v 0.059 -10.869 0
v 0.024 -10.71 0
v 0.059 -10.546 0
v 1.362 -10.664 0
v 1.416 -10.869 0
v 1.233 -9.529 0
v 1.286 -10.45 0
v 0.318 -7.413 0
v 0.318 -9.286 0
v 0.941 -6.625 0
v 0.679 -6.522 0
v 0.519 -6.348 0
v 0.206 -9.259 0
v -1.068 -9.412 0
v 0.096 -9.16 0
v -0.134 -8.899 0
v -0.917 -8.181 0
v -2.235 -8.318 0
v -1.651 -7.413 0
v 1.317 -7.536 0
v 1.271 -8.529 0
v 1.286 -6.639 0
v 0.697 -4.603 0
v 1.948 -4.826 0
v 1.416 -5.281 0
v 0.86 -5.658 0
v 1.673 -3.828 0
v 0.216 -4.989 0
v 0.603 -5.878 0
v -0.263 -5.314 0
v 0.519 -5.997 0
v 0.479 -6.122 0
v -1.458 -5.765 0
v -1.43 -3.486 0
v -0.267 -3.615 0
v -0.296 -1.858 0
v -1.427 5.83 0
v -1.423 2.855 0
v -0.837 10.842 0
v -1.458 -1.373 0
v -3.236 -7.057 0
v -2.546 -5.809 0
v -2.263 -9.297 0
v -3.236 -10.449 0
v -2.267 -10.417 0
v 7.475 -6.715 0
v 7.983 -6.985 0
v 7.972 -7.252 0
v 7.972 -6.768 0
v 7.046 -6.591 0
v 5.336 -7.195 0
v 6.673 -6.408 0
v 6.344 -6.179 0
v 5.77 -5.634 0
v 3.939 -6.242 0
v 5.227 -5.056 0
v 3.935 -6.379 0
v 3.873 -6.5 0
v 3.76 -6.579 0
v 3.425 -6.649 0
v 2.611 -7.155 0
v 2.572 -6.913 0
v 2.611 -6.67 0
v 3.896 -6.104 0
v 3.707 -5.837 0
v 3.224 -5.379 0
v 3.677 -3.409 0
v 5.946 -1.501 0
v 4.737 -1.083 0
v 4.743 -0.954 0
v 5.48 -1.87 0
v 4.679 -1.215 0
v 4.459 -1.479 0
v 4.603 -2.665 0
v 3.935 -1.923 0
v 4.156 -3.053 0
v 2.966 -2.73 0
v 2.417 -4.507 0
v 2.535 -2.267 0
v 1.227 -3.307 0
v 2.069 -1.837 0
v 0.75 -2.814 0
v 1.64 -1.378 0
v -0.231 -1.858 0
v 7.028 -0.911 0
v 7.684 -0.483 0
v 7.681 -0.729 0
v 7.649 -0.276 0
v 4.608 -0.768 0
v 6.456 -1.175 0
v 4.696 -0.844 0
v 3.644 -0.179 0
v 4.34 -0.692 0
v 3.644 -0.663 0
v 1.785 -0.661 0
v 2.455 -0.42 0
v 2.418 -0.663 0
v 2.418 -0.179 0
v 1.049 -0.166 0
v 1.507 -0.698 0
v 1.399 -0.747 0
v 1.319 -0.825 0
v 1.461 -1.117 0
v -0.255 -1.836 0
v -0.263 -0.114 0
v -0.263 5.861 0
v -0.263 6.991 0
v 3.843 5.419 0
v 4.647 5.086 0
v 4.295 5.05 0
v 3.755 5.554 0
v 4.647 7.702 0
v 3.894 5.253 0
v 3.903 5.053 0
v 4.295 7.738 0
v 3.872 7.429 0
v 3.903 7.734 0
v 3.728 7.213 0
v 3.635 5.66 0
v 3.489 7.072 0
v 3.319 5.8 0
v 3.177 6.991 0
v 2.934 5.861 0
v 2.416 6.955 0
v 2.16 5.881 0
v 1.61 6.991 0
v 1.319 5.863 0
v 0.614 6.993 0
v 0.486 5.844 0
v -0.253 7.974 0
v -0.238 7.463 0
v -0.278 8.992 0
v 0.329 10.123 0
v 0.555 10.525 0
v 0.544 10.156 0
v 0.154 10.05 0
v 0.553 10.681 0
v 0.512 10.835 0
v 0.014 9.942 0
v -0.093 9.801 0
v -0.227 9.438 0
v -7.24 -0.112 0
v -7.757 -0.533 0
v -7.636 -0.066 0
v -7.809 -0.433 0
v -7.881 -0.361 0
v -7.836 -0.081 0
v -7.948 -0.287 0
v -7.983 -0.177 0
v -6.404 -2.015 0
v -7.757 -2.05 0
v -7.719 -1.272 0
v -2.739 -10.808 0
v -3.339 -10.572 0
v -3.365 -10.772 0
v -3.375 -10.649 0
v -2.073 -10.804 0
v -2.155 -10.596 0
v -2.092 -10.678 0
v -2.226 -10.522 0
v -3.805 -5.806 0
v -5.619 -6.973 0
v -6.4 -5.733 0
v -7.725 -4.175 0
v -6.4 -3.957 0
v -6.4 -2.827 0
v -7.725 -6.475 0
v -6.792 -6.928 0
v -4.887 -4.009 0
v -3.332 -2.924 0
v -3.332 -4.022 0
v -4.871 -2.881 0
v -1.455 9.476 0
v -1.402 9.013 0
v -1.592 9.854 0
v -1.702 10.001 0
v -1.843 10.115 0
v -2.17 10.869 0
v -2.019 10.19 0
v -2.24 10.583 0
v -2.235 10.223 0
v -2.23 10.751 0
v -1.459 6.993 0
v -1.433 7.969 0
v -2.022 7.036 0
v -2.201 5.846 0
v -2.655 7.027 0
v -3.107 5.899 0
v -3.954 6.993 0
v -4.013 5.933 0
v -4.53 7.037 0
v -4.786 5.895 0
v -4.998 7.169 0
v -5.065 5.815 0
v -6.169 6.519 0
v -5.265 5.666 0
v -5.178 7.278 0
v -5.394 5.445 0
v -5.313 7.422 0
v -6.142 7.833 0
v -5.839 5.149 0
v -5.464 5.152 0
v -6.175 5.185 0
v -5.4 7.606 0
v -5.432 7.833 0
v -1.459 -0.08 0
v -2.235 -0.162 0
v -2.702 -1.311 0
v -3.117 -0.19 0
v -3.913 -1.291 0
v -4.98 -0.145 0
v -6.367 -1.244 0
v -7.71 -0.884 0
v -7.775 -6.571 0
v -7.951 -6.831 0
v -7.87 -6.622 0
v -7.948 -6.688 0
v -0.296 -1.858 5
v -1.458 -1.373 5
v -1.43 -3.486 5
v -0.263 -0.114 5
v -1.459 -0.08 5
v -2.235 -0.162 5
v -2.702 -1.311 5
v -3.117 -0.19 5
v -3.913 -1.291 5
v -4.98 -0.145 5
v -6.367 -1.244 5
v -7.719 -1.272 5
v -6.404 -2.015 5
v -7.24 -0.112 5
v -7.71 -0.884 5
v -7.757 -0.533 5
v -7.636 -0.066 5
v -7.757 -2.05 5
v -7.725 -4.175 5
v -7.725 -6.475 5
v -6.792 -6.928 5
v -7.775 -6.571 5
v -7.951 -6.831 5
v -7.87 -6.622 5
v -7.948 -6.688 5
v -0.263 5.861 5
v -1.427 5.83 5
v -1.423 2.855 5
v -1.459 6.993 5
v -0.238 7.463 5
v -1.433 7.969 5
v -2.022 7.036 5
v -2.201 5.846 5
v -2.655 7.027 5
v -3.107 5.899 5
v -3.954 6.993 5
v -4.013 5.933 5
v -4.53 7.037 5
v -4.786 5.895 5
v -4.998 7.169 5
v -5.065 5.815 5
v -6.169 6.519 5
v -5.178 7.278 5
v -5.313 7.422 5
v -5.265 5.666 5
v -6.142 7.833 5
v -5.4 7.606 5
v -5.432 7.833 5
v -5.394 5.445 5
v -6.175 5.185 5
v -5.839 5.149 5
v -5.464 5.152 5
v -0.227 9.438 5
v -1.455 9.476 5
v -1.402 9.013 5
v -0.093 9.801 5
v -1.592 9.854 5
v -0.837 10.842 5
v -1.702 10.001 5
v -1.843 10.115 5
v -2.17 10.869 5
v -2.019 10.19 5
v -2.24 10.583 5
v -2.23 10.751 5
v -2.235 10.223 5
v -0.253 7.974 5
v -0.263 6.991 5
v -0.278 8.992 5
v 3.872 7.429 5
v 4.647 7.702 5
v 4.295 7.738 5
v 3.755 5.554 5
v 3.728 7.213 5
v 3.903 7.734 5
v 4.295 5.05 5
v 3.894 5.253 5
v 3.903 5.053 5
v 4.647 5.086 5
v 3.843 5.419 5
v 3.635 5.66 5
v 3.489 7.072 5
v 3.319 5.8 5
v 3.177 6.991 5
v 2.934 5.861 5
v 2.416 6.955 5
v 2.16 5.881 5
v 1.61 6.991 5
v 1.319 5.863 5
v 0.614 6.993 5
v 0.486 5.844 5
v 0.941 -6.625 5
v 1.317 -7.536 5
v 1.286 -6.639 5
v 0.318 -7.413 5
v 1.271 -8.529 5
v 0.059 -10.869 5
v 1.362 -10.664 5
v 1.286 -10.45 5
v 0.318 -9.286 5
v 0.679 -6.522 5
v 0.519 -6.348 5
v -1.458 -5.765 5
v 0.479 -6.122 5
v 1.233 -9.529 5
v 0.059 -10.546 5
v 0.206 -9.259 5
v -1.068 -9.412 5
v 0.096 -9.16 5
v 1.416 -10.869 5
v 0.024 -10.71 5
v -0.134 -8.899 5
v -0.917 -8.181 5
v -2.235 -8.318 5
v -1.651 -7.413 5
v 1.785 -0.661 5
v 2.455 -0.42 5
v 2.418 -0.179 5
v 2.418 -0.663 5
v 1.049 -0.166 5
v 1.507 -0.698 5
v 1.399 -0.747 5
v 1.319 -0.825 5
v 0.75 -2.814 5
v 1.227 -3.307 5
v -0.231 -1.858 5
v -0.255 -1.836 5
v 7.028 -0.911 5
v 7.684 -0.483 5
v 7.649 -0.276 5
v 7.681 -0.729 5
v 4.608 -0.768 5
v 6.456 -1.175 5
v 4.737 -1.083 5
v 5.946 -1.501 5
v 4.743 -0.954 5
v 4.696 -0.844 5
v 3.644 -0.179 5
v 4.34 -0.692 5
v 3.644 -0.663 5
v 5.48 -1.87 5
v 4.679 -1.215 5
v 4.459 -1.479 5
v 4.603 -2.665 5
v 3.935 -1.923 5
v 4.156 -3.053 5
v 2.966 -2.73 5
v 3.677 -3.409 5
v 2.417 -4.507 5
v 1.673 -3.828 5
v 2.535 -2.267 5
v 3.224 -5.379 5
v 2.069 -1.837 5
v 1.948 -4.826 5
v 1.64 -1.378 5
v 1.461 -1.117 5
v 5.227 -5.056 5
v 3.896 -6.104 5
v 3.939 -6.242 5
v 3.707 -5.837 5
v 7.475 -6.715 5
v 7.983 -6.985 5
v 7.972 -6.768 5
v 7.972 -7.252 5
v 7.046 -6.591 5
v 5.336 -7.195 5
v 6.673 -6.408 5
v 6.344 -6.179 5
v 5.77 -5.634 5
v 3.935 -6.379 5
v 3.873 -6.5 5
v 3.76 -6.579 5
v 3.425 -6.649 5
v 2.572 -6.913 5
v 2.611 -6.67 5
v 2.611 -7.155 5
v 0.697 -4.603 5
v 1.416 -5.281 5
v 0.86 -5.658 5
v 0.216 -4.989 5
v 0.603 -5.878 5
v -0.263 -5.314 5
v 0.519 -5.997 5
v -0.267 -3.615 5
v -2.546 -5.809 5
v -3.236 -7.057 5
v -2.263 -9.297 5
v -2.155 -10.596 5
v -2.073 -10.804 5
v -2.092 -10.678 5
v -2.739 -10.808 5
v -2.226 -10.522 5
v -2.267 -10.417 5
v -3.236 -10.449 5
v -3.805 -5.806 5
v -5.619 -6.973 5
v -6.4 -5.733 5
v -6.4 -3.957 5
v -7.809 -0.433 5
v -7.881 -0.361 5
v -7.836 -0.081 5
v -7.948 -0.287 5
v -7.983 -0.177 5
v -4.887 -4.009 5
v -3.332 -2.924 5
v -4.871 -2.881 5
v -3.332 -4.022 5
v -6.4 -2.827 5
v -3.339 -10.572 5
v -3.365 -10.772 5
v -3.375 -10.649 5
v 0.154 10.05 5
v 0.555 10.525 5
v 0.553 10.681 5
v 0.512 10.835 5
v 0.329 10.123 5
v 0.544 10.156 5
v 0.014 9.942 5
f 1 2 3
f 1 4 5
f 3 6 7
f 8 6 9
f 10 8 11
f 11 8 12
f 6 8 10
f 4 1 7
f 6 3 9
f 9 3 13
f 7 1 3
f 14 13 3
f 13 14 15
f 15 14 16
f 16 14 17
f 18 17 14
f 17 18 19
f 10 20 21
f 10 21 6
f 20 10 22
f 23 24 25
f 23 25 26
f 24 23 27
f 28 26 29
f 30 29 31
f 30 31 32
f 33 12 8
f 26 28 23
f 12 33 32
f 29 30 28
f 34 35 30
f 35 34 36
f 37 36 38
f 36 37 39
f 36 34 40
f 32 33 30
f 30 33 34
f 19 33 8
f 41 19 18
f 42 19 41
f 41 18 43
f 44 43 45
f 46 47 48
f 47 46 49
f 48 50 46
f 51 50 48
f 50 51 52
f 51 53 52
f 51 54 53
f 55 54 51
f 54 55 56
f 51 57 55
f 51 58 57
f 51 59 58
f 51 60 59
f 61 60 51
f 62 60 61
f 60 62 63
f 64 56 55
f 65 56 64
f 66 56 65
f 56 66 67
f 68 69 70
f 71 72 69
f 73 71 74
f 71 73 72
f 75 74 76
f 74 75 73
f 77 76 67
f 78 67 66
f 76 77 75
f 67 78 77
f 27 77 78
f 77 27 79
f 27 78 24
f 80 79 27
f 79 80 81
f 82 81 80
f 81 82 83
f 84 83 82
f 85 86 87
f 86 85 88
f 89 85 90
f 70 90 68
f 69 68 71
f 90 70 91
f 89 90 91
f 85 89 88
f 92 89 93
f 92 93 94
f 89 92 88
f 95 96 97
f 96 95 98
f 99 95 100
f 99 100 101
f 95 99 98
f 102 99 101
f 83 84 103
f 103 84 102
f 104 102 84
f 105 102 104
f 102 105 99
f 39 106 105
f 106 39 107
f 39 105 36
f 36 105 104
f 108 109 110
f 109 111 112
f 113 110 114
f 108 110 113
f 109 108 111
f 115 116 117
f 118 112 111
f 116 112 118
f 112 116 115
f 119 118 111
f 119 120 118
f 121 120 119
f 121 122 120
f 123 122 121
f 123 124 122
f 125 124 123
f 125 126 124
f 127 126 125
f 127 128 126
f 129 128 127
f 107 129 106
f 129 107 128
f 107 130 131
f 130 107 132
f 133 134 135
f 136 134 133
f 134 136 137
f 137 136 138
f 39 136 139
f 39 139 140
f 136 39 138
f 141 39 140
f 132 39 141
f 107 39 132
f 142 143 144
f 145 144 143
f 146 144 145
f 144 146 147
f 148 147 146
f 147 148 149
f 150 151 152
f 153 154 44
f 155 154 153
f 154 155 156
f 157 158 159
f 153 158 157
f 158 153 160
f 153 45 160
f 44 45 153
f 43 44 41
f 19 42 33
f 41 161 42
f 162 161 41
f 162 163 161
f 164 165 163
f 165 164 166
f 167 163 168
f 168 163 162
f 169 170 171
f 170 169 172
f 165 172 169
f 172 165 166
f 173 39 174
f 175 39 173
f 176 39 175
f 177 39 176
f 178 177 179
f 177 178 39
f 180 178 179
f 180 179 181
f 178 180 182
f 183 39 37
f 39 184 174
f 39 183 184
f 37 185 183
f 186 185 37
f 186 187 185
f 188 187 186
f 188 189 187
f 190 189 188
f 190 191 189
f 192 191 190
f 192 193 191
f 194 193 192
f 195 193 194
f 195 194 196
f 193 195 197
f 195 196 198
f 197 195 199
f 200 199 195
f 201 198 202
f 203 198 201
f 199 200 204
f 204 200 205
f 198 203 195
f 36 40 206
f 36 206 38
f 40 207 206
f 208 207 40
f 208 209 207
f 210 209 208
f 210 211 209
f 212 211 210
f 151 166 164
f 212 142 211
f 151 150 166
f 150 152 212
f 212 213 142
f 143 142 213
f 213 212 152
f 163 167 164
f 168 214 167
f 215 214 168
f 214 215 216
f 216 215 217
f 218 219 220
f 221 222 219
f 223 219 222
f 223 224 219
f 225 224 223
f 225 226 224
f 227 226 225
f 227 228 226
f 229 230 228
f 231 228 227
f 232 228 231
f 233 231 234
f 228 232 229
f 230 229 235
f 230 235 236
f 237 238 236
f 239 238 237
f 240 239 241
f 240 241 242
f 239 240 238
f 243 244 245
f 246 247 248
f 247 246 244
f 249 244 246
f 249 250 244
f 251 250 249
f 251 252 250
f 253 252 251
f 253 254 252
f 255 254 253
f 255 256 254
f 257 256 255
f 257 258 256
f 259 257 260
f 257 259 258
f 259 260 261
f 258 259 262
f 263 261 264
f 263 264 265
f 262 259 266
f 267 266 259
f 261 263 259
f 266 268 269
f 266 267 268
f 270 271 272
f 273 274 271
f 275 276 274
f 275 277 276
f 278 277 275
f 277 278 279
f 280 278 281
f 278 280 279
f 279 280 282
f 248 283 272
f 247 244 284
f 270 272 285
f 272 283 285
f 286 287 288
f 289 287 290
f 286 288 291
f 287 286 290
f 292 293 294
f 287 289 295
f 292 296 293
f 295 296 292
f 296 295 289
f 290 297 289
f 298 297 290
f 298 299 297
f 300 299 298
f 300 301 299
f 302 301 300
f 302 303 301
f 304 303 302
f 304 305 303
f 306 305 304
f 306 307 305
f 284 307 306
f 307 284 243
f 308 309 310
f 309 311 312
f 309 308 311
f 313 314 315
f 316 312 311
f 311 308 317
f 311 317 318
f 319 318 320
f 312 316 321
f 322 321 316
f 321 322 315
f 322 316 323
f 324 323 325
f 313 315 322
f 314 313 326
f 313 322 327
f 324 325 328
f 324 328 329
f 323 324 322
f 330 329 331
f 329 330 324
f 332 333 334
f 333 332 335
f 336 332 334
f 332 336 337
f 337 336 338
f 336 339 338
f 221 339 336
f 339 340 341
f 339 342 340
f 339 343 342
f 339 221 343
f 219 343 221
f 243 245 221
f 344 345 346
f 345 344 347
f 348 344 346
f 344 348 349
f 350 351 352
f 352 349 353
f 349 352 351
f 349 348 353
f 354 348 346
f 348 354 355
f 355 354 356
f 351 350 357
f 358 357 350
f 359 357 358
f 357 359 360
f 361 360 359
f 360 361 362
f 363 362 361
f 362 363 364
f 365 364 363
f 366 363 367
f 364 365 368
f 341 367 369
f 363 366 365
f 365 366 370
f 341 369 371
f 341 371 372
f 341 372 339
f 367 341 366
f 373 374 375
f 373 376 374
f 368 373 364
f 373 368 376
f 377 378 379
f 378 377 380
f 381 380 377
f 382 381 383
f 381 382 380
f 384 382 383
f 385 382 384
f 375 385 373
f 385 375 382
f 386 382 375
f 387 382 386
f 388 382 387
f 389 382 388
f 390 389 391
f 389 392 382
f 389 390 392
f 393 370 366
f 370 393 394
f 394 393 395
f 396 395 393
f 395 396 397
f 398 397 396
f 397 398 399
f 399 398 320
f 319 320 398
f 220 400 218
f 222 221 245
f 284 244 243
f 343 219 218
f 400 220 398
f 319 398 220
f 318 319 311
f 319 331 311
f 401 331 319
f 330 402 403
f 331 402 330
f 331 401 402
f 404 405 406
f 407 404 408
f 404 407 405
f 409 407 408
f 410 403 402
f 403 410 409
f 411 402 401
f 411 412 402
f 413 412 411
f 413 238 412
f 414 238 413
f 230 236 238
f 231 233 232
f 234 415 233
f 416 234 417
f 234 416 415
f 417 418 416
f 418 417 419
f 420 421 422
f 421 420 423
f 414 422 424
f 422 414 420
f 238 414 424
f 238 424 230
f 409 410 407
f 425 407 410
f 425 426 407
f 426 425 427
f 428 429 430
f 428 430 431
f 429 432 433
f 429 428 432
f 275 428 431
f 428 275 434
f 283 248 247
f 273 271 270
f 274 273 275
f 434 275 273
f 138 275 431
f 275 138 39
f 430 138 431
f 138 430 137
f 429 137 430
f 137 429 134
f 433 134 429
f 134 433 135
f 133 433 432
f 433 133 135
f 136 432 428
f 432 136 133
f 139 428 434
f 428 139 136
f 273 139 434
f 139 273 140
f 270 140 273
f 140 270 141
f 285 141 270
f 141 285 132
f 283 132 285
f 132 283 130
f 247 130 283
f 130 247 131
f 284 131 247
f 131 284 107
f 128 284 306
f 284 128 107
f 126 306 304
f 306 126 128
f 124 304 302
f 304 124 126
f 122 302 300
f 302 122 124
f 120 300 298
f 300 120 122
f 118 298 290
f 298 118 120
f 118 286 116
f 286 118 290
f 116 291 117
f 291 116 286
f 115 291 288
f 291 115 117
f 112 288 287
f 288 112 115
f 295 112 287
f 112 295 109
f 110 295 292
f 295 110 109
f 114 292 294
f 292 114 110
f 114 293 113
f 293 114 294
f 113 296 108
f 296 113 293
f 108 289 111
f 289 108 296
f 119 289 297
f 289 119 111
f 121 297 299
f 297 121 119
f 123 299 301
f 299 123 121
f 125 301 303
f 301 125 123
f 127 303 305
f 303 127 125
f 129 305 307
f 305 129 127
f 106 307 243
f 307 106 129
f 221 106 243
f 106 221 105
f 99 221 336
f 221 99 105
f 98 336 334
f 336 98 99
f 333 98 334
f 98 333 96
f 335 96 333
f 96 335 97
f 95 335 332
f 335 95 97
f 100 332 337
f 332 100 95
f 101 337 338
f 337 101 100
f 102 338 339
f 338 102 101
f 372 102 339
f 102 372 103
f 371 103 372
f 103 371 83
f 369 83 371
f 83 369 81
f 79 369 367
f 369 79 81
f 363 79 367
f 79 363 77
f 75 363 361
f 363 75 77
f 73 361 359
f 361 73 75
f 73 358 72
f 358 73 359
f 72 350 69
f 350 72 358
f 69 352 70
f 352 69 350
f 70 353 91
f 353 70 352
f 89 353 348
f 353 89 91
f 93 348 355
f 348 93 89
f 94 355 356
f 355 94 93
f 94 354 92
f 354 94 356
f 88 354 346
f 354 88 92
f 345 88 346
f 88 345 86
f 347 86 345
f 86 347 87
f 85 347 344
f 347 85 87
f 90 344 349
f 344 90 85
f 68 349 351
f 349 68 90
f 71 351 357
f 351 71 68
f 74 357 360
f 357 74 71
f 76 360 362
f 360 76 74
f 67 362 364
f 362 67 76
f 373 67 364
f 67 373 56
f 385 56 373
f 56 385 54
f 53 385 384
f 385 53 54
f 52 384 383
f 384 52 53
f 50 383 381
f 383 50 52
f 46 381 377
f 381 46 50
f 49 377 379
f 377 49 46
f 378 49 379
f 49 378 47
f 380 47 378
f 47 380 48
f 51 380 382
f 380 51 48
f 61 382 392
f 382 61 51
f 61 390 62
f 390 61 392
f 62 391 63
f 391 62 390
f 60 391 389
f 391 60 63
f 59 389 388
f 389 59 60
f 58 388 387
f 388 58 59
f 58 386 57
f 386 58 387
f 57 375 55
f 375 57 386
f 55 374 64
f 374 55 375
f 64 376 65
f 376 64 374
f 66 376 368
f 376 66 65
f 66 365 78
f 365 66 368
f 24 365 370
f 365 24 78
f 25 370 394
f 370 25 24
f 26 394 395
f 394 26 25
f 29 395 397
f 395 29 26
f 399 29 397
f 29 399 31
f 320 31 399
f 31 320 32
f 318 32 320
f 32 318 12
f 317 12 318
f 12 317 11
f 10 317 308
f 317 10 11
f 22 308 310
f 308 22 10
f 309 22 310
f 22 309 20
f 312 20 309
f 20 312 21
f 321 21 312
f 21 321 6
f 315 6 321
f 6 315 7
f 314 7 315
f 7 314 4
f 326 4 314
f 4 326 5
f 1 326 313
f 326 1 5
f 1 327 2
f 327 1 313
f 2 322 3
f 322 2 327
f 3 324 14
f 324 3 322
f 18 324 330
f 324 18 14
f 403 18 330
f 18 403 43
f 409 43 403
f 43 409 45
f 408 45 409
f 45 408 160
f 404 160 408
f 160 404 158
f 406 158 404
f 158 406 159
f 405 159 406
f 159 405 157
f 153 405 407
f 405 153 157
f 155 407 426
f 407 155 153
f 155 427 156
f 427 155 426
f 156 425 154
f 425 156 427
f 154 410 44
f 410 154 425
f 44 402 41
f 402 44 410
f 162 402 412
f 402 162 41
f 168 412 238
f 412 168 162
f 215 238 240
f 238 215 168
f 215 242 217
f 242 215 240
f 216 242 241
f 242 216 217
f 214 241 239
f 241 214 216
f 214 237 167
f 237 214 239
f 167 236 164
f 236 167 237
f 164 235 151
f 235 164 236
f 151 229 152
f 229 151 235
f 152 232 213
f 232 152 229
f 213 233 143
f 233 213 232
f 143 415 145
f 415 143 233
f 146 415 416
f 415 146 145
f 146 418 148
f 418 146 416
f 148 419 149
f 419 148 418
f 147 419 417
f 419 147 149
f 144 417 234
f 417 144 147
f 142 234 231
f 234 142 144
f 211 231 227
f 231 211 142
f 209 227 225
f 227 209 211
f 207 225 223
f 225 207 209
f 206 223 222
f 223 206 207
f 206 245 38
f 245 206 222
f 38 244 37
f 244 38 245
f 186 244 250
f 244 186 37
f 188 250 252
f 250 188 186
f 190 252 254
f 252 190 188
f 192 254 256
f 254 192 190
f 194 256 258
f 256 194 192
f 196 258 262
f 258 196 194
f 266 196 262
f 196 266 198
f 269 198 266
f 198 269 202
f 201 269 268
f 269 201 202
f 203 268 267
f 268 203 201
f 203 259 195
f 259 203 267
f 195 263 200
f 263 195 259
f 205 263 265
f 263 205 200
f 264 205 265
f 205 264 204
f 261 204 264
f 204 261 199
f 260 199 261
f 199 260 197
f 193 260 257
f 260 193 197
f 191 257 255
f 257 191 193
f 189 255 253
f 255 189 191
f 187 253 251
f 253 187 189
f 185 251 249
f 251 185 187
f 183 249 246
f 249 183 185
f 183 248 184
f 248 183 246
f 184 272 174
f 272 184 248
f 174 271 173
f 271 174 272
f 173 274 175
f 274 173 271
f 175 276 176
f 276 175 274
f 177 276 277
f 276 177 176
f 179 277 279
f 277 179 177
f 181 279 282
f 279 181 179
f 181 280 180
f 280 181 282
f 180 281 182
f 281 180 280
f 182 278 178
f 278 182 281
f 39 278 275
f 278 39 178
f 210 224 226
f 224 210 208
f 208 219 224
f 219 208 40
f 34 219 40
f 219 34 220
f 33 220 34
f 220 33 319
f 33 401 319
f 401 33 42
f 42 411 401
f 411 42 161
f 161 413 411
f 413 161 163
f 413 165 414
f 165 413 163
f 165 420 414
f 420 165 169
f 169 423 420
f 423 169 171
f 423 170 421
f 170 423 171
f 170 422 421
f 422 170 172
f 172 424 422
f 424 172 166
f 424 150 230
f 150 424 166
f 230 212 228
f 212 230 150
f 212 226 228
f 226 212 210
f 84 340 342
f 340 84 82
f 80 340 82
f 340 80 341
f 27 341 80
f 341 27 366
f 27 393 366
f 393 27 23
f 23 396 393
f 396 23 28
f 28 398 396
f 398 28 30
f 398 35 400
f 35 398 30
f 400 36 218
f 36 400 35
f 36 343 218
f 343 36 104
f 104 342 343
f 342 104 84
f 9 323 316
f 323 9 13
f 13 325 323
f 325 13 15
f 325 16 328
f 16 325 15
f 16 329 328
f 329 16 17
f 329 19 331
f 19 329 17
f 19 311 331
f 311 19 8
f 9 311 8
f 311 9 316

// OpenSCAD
// Module names are of the form poly_<inkscape-path-id>().  As a result,
// you can associate a polygon in this OpenSCAD program with the corresponding
// SVG element in the Inkscape document by looking for the XML element with
// the attribute id="inkscape-path-id".

// fudge value is used to ensure that subtracted solids are a tad taller
// in the z dimension than the polygon being subtracted from.  This helps
// keep the resulting .stl file manifold.
fudge = 0.1;

module poly_path2(h)
{
  scale([25.4/90, -25.4/90, 1]) union()
  {
    difference()
    {
       linear_extrude(height=h)
         polygon([[1.813375,-38.390500],[1.959031,-37.847828],[1.966875,-37.293625],[1.928375,-35.987500],[1.166093,-35.870010],[0.544621,-35.611672],[0.050456,-35.225998],[-0.329906,-34.726500],[-0.803230,-33.440078],[-0.983375,-31.860500],[-0.896219,-28.254250],[-0.844965,-26.443766],[-0.932625,-24.772500],[2.176250,-24.777750],[5.704375,-24.772500],[8.560156,-24.644734],[11.256375,-24.771875],[12.361777,-25.057100],[13.207844,-25.557328],[13.721426,-26.322986],[13.829375,-27.404500],[15.217375,-27.417250],[16.464375,-27.290500],[16.464375,-18.020500],[15.217375,-17.892875],[13.829375,-17.905500],[13.796545,-18.614137],[13.615859,-19.201906],[13.304650,-19.679098],[12.880250,-20.056000],[11.761203,-20.550094],[10.397375,-20.766500],[7.655203,-20.838500],[4.675000,-20.774000],[1.723484,-20.705750],[-0.932625,-20.766500],[-0.932625,0.405500],[3.718375,0.589375],[8.567375,0.634500],[8.697875,1.486875],[8.567375,2.350500],[6.323750,2.341375],[5.339047,2.472141],[4.955662,2.646619],[4.673375,2.922500],[5.177783,3.959068],[5.810266,4.883547],[7.332000,6.510375],[8.983672,8.031266],[10.510375,9.674500],[13.944375,6.813500],[15.801125,5.241000],[16.580531,4.305313],[16.783285,3.836367],[16.804375,3.380500],[16.637797,2.991588],[16.326750,2.722453],[15.377375,2.452625],[12.912375,2.350500],[12.912375,0.634500],[27.101375,0.977500],[27.225125,1.711250],[27.215375,2.581500],[24.902027,3.228287],[22.875344,4.162172],[21.069113,5.316814],[19.417125,6.625875],[16.311031,9.441891],[14.724504,10.816166],[13.027375,12.079500],[18.519375,17.915500],[20.444109,19.962266],[22.478250,21.894375],[23.643662,22.705314],[24.965203,23.353047],[26.485799,23.792725],[28.248375,23.979500],[28.286625,24.749625],[28.248375,25.694500],[18.908625,25.495000],[9.252375,25.352500],[9.114375,24.495375],[9.252375,23.634500],[12.134500,23.559375],[13.323047,23.311766],[13.722982,23.030572],[13.943375,22.604500],[13.958467,22.116094],[13.803297,21.629000],[13.134000,20.682000],[11.422375,19.059500],[8.564375,15.968500],[6.902250,17.100625],[5.017375,18.713500],[3.047250,20.046750],[2.137234,20.827094],[1.838842,21.248074],[1.697375,21.690500],[1.837547,22.492281],[2.406250,23.108250],[3.335516,23.473344],[4.557375,23.522500],[4.665375,26.702797],[4.504125,30.219375],[4.369500,33.763516],[4.557375,37.026500],[4.826750,37.785125],[5.017375,38.511500],[0.208375,38.511500],[0.085750,37.950375],[0.208375,37.367500],[-3.784875,33.349000],[-7.917625,29.471500],[-8.018500,32.942750],[-8.031625,36.910500],[-7.887859,37.281797],[-7.637500,37.546125],[-7.412453,37.835391],[-7.344625,38.281500],[-9.704875,38.296750],[-11.922625,38.169500],[-11.960187,37.731266],[-11.832375,37.458125],[-11.464625,37.023500],[-11.464625,25.005500],[-19.911250,24.705875],[-24.067859,24.548891],[-28.172625,24.204500],[-28.163203,23.699094],[-27.884250,23.463500],[-27.549234,23.283406],[-27.371625,22.944500],[-27.370500,14.794000],[-27.485625,7.264500],[-27.352125,4.505875],[-27.317156,3.133641],[-27.485625,1.887500],[-27.671391,1.533125],[-27.926250,1.280750],[-28.161047,1.016750],[-28.286625,0.627500],[-27.765406,0.288531],[-27.056875,0.235500],[-25.654625,0.398500],[-17.644625,0.512500],[-11.043875,0.674375],[-7.920125,0.575359],[-5.170625,0.283500],[-5.042000,-10.115500],[-5.056625,-20.658500],[-7.798156,-20.715250],[-11.009375,-20.901000],[-14.219469,-21.023000],[-16.957625,-20.888500],[-17.946937,-20.605766],[-18.653875,-20.075625],[-19.113687,-19.293672],[-19.361625,-18.255500],[-20.689875,-18.243250],[-21.878625,-18.370500],[-21.858375,-23.099125],[-21.764625,-27.753500],[-19.246625,-27.753500],[-19.134072,-26.949135],[-18.827187,-26.299141],[-18.345693,-25.788107],[-17.709312,-25.400625],[-16.050781,-24.934672],[-14.009375,-24.778000],[-9.409062,-24.899375],[-7.165719,-24.930859],[-5.170625,-24.778500],[-5.079250,-28.235547],[-4.966125,-31.935125],[-5.154766,-33.575834],[-5.642000,-34.917141],[-6.029260,-35.438014],[-6.529172,-35.839033],[-7.154404,-36.105196],[-7.917625,-36.221500],[-7.936250,-37.499625],[-7.900328,-38.093078],[-7.688625,-38.511500],[-2.967250,-38.417250],[1.813375,-38.390500]]);
       translate([0, 0, -fudge])
         linear_extrude(height=h+2*fudge)
           polygon([[-22.561625,4.408500],[-22.690750,7.141125],[-22.676625,10.015500],[-17.260875,10.208125],[-11.804625,10.359500],[-11.804625,14.250500],[-17.316750,14.203500],[-22.676625,14.021500],[-22.676625,20.314500],[-13.483375,20.572125],[-9.022500,20.584078],[-5.167625,20.428500],[-5.066375,12.350750],[-5.167625,4.865500],[-9.575609,4.644891],[-13.865750,4.572875],[-22.561625,4.408500]]);
       translate([0, 0, -fudge])
         linear_extrude(height=h+2*fudge)
           polygon([[-0.819625,6.583500],[-0.904125,6.505875],[-1.048625,6.583500],[-0.945750,12.810250],[-0.933625,18.828500],[0.765344,17.677750],[2.469375,16.310250],[5.929375,13.562500],[4.346234,11.716031],[2.658000,9.972500],[-0.819625,6.583500]]);
       translate([0, 0, -fudge])
         linear_extrude(height=h+2*fudge)
           polygon([[-0.475625,31.531500],[0.339500,32.455750],[0.729391,32.806406],[1.128375,32.904500],[1.128375,26.265500],[-5.851625,26.265500],[-3.250250,28.986625],[-0.475625,31.531500]]);
    }
  }
}

poly_path2(5);
